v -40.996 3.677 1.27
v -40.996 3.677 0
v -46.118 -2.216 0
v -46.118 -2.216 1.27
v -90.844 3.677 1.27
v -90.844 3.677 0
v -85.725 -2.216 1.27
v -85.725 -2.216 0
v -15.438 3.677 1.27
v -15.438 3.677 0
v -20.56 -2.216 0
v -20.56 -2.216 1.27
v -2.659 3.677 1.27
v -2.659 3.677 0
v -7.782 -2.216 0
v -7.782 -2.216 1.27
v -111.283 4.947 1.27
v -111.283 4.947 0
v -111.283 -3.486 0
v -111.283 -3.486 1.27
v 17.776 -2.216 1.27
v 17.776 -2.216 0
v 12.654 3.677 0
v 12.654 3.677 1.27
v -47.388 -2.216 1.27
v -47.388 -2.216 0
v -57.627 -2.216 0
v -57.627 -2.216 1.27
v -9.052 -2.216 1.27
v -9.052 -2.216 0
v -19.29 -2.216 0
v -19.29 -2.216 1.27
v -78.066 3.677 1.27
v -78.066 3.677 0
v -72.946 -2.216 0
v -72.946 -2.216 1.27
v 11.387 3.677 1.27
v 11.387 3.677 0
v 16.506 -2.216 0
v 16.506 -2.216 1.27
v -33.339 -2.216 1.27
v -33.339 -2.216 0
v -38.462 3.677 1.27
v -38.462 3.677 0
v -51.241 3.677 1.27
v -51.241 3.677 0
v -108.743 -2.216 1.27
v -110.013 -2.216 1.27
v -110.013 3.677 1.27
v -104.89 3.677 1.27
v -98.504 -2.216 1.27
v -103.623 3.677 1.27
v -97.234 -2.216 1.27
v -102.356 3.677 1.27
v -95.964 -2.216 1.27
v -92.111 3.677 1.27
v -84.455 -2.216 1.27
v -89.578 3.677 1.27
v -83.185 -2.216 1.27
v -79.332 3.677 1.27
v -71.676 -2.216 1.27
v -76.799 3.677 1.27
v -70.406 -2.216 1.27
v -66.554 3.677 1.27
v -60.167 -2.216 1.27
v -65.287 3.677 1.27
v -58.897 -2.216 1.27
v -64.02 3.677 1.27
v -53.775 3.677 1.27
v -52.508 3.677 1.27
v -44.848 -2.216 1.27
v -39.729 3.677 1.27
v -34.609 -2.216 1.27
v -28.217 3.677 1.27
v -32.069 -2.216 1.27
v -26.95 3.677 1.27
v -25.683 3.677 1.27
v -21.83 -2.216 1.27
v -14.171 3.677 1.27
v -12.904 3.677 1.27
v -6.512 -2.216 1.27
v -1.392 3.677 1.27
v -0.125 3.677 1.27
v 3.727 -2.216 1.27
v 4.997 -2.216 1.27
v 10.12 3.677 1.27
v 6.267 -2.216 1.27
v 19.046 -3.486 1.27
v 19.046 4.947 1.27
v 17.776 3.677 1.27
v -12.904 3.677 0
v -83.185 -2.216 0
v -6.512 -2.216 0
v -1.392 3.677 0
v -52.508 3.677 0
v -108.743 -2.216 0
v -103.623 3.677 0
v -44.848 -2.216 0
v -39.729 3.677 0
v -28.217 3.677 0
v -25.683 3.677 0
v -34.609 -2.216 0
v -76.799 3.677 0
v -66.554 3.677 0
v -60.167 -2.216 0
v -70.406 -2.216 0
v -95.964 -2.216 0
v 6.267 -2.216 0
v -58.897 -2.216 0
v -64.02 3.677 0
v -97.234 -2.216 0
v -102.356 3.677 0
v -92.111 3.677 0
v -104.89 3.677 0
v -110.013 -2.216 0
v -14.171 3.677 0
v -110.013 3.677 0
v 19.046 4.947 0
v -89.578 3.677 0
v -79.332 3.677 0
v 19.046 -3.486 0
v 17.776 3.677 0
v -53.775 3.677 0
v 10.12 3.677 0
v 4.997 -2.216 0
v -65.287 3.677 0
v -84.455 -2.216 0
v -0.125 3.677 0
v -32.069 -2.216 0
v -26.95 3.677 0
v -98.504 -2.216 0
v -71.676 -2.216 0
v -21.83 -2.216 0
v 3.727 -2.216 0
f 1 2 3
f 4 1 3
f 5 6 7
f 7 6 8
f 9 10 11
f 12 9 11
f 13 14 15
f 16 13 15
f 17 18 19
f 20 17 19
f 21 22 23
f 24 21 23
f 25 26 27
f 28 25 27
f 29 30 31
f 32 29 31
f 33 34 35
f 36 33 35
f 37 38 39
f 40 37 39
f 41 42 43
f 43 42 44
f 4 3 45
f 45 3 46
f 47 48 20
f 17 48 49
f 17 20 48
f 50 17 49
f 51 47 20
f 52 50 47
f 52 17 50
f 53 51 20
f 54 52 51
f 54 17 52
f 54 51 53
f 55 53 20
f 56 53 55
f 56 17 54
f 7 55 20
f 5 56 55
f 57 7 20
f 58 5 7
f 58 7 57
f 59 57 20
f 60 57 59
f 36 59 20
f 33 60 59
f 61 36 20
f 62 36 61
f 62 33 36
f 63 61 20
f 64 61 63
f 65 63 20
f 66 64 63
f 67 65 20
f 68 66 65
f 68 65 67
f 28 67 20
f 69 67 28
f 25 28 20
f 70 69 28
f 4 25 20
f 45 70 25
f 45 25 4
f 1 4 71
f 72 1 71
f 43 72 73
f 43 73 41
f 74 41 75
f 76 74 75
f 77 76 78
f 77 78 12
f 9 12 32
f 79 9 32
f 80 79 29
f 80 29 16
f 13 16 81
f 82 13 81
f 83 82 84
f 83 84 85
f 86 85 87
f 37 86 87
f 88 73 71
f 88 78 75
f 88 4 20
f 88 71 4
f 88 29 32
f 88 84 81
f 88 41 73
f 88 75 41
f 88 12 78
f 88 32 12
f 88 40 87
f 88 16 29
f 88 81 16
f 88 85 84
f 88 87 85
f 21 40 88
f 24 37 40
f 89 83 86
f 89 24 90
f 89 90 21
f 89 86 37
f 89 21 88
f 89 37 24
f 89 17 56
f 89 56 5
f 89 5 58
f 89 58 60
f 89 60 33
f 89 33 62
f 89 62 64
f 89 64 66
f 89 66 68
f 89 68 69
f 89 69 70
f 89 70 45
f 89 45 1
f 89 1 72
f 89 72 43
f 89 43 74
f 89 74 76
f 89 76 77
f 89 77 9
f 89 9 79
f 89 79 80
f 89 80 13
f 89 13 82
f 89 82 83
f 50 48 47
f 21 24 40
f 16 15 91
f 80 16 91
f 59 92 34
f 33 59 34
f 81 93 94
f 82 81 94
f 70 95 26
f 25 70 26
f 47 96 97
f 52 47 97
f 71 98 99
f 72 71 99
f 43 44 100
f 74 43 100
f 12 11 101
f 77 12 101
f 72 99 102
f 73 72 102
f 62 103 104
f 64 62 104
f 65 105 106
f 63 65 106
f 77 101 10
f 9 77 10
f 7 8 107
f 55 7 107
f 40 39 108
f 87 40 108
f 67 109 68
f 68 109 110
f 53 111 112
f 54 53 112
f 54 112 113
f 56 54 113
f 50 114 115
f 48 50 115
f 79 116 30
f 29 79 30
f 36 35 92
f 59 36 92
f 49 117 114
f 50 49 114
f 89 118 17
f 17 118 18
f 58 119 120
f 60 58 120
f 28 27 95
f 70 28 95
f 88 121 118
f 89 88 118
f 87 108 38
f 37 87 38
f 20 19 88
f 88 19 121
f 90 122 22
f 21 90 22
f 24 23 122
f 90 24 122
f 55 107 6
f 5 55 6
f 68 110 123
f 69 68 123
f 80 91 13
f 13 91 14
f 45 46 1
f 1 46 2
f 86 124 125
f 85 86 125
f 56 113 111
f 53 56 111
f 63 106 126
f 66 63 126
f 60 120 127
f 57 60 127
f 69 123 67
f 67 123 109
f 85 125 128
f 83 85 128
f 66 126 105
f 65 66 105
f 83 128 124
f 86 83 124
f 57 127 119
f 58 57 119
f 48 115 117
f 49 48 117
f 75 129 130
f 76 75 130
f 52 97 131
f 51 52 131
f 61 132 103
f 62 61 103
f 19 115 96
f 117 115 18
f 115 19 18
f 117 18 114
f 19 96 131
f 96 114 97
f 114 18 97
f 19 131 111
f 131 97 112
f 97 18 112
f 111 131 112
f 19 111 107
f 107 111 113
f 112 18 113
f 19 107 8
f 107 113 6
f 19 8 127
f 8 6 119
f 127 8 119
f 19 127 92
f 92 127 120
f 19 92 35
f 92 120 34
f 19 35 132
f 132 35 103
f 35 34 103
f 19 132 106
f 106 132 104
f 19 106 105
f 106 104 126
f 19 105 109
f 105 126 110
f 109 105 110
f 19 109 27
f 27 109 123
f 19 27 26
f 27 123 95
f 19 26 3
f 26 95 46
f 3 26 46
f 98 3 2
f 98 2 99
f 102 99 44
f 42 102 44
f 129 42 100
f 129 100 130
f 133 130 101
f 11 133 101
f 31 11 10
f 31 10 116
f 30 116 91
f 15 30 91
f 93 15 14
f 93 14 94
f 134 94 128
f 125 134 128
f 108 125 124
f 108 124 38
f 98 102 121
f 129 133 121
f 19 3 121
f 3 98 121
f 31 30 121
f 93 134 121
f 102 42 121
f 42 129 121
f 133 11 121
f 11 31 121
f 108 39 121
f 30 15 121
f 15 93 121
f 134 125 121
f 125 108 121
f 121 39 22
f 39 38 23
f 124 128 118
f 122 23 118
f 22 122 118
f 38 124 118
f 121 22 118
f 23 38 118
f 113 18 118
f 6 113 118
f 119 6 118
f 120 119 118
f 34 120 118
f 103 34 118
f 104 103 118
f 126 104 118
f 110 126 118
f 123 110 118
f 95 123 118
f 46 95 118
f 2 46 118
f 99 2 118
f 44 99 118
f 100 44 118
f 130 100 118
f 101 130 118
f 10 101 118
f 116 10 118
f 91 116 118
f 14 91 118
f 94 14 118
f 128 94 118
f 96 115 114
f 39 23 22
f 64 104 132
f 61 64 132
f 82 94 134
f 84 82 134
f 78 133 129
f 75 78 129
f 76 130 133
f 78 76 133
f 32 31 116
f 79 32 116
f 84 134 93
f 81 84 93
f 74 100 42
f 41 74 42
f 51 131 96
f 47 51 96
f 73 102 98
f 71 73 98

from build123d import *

# Parameters (mm, degrees)
F1_DEPTH = 1.27


with BuildPart() as f1:
    # F0 (on Top) → F1 (new body)
    with BuildSketch(Plane.XY):
        Polygon((19.046307, 4.947169), (-111.282837, 4.947169), (-111.282837, -3.485631), (19.046307, -3.485631), (19.046307, -2.215631), align=None)
        Polygon((-110.012837, -2.215631), (-110.012837, 3.677169), (-104.890304, 3.677169), align=None, mode=Mode.SUBTRACT)
        Polygon((-98.503923, -2.215631), (-108.742837, -2.215631), (-103.62338, 3.677169), align=None, mode=Mode.SUBTRACT)
        Polygon((-92.11139, 3.677169), (-97.233923, -2.215631), (-102.356456, 3.677169), align=None, mode=Mode.SUBTRACT)
        Polygon((-85.725008, -2.215631), (-95.963923, -2.215631), (-90.844466, 3.677169), align=None, mode=Mode.SUBTRACT)
        Polygon((-79.332476, 3.677169), (-84.455008, -2.215631), (-89.577541, 3.677169), align=None, mode=Mode.SUBTRACT)
        Polygon((-72.946094, -2.215631), (-83.185008, -2.215631), (-78.065551, 3.677169), align=None, mode=Mode.SUBTRACT)
        Polygon((-66.553561, 3.677169), (-71.676094, -2.215631), (-76.798627, 3.677169), align=None, mode=Mode.SUBTRACT)
        Polygon((-70.406094, -2.215631), (-65.286637, 3.677169), (-60.16718, -2.215631), align=None, mode=Mode.SUBTRACT)
        Polygon((-53.774647, 3.677169), (-58.89718, -2.215631), (-64.019712, 3.677169), align=None, mode=Mode.SUBTRACT)
        Polygon((-47.388265, -2.215631), (-57.62718, -2.215631), (-52.507722, 3.677169), align=None, mode=Mode.SUBTRACT)
        Polygon((-40.995732, 3.677169), (-46.118265, -2.215631), (-51.240798, 3.677169), align=None, mode=Mode.SUBTRACT)
        Polygon((-44.848265, -2.215631), (-39.728808, 3.677169), (-34.609351, -2.215631), align=None, mode=Mode.SUBTRACT)
        Polygon((-28.216818, 3.677169), (-33.339351, -2.215631), (-38.461884, 3.677169), align=None, mode=Mode.SUBTRACT)
        Polygon((-32.069351, -2.215631), (-26.949893, 3.677169), (-21.830436, -2.215631), align=None, mode=Mode.SUBTRACT)
        Polygon((-15.437903, 3.677169), (-20.560436, -2.215631), (-25.682969, 3.677169), align=None, mode=Mode.SUBTRACT)
        Polygon((-19.290436, -2.215631), (-14.170979, 3.677169), (-9.051522, -2.215631), align=None, mode=Mode.SUBTRACT)
        Polygon((-2.658989, 3.677169), (-7.781522, -2.215631), (-12.904055, 3.677169), align=None, mode=Mode.SUBTRACT)
        Polygon((3.727393, -2.215631), (-6.511522, -2.215631), (-1.392065, 3.677169), align=None, mode=Mode.SUBTRACT)
        Polygon((10.119926, 3.677169), (4.997393, -2.215631), (-0.12514, 3.677169), align=None, mode=Mode.SUBTRACT)
        Polygon((6.267393, -2.215631), (11.38685, 3.677169), (16.506307, -2.215631), align=None, mode=Mode.SUBTRACT)
        Polygon((17.776307, 3.677169), (17.776307, -2.215631), (12.653774, 3.677169), align=None, mode=Mode.SUBTRACT)
    extrude(amount=F1_DEPTH)


solid = f1.part
